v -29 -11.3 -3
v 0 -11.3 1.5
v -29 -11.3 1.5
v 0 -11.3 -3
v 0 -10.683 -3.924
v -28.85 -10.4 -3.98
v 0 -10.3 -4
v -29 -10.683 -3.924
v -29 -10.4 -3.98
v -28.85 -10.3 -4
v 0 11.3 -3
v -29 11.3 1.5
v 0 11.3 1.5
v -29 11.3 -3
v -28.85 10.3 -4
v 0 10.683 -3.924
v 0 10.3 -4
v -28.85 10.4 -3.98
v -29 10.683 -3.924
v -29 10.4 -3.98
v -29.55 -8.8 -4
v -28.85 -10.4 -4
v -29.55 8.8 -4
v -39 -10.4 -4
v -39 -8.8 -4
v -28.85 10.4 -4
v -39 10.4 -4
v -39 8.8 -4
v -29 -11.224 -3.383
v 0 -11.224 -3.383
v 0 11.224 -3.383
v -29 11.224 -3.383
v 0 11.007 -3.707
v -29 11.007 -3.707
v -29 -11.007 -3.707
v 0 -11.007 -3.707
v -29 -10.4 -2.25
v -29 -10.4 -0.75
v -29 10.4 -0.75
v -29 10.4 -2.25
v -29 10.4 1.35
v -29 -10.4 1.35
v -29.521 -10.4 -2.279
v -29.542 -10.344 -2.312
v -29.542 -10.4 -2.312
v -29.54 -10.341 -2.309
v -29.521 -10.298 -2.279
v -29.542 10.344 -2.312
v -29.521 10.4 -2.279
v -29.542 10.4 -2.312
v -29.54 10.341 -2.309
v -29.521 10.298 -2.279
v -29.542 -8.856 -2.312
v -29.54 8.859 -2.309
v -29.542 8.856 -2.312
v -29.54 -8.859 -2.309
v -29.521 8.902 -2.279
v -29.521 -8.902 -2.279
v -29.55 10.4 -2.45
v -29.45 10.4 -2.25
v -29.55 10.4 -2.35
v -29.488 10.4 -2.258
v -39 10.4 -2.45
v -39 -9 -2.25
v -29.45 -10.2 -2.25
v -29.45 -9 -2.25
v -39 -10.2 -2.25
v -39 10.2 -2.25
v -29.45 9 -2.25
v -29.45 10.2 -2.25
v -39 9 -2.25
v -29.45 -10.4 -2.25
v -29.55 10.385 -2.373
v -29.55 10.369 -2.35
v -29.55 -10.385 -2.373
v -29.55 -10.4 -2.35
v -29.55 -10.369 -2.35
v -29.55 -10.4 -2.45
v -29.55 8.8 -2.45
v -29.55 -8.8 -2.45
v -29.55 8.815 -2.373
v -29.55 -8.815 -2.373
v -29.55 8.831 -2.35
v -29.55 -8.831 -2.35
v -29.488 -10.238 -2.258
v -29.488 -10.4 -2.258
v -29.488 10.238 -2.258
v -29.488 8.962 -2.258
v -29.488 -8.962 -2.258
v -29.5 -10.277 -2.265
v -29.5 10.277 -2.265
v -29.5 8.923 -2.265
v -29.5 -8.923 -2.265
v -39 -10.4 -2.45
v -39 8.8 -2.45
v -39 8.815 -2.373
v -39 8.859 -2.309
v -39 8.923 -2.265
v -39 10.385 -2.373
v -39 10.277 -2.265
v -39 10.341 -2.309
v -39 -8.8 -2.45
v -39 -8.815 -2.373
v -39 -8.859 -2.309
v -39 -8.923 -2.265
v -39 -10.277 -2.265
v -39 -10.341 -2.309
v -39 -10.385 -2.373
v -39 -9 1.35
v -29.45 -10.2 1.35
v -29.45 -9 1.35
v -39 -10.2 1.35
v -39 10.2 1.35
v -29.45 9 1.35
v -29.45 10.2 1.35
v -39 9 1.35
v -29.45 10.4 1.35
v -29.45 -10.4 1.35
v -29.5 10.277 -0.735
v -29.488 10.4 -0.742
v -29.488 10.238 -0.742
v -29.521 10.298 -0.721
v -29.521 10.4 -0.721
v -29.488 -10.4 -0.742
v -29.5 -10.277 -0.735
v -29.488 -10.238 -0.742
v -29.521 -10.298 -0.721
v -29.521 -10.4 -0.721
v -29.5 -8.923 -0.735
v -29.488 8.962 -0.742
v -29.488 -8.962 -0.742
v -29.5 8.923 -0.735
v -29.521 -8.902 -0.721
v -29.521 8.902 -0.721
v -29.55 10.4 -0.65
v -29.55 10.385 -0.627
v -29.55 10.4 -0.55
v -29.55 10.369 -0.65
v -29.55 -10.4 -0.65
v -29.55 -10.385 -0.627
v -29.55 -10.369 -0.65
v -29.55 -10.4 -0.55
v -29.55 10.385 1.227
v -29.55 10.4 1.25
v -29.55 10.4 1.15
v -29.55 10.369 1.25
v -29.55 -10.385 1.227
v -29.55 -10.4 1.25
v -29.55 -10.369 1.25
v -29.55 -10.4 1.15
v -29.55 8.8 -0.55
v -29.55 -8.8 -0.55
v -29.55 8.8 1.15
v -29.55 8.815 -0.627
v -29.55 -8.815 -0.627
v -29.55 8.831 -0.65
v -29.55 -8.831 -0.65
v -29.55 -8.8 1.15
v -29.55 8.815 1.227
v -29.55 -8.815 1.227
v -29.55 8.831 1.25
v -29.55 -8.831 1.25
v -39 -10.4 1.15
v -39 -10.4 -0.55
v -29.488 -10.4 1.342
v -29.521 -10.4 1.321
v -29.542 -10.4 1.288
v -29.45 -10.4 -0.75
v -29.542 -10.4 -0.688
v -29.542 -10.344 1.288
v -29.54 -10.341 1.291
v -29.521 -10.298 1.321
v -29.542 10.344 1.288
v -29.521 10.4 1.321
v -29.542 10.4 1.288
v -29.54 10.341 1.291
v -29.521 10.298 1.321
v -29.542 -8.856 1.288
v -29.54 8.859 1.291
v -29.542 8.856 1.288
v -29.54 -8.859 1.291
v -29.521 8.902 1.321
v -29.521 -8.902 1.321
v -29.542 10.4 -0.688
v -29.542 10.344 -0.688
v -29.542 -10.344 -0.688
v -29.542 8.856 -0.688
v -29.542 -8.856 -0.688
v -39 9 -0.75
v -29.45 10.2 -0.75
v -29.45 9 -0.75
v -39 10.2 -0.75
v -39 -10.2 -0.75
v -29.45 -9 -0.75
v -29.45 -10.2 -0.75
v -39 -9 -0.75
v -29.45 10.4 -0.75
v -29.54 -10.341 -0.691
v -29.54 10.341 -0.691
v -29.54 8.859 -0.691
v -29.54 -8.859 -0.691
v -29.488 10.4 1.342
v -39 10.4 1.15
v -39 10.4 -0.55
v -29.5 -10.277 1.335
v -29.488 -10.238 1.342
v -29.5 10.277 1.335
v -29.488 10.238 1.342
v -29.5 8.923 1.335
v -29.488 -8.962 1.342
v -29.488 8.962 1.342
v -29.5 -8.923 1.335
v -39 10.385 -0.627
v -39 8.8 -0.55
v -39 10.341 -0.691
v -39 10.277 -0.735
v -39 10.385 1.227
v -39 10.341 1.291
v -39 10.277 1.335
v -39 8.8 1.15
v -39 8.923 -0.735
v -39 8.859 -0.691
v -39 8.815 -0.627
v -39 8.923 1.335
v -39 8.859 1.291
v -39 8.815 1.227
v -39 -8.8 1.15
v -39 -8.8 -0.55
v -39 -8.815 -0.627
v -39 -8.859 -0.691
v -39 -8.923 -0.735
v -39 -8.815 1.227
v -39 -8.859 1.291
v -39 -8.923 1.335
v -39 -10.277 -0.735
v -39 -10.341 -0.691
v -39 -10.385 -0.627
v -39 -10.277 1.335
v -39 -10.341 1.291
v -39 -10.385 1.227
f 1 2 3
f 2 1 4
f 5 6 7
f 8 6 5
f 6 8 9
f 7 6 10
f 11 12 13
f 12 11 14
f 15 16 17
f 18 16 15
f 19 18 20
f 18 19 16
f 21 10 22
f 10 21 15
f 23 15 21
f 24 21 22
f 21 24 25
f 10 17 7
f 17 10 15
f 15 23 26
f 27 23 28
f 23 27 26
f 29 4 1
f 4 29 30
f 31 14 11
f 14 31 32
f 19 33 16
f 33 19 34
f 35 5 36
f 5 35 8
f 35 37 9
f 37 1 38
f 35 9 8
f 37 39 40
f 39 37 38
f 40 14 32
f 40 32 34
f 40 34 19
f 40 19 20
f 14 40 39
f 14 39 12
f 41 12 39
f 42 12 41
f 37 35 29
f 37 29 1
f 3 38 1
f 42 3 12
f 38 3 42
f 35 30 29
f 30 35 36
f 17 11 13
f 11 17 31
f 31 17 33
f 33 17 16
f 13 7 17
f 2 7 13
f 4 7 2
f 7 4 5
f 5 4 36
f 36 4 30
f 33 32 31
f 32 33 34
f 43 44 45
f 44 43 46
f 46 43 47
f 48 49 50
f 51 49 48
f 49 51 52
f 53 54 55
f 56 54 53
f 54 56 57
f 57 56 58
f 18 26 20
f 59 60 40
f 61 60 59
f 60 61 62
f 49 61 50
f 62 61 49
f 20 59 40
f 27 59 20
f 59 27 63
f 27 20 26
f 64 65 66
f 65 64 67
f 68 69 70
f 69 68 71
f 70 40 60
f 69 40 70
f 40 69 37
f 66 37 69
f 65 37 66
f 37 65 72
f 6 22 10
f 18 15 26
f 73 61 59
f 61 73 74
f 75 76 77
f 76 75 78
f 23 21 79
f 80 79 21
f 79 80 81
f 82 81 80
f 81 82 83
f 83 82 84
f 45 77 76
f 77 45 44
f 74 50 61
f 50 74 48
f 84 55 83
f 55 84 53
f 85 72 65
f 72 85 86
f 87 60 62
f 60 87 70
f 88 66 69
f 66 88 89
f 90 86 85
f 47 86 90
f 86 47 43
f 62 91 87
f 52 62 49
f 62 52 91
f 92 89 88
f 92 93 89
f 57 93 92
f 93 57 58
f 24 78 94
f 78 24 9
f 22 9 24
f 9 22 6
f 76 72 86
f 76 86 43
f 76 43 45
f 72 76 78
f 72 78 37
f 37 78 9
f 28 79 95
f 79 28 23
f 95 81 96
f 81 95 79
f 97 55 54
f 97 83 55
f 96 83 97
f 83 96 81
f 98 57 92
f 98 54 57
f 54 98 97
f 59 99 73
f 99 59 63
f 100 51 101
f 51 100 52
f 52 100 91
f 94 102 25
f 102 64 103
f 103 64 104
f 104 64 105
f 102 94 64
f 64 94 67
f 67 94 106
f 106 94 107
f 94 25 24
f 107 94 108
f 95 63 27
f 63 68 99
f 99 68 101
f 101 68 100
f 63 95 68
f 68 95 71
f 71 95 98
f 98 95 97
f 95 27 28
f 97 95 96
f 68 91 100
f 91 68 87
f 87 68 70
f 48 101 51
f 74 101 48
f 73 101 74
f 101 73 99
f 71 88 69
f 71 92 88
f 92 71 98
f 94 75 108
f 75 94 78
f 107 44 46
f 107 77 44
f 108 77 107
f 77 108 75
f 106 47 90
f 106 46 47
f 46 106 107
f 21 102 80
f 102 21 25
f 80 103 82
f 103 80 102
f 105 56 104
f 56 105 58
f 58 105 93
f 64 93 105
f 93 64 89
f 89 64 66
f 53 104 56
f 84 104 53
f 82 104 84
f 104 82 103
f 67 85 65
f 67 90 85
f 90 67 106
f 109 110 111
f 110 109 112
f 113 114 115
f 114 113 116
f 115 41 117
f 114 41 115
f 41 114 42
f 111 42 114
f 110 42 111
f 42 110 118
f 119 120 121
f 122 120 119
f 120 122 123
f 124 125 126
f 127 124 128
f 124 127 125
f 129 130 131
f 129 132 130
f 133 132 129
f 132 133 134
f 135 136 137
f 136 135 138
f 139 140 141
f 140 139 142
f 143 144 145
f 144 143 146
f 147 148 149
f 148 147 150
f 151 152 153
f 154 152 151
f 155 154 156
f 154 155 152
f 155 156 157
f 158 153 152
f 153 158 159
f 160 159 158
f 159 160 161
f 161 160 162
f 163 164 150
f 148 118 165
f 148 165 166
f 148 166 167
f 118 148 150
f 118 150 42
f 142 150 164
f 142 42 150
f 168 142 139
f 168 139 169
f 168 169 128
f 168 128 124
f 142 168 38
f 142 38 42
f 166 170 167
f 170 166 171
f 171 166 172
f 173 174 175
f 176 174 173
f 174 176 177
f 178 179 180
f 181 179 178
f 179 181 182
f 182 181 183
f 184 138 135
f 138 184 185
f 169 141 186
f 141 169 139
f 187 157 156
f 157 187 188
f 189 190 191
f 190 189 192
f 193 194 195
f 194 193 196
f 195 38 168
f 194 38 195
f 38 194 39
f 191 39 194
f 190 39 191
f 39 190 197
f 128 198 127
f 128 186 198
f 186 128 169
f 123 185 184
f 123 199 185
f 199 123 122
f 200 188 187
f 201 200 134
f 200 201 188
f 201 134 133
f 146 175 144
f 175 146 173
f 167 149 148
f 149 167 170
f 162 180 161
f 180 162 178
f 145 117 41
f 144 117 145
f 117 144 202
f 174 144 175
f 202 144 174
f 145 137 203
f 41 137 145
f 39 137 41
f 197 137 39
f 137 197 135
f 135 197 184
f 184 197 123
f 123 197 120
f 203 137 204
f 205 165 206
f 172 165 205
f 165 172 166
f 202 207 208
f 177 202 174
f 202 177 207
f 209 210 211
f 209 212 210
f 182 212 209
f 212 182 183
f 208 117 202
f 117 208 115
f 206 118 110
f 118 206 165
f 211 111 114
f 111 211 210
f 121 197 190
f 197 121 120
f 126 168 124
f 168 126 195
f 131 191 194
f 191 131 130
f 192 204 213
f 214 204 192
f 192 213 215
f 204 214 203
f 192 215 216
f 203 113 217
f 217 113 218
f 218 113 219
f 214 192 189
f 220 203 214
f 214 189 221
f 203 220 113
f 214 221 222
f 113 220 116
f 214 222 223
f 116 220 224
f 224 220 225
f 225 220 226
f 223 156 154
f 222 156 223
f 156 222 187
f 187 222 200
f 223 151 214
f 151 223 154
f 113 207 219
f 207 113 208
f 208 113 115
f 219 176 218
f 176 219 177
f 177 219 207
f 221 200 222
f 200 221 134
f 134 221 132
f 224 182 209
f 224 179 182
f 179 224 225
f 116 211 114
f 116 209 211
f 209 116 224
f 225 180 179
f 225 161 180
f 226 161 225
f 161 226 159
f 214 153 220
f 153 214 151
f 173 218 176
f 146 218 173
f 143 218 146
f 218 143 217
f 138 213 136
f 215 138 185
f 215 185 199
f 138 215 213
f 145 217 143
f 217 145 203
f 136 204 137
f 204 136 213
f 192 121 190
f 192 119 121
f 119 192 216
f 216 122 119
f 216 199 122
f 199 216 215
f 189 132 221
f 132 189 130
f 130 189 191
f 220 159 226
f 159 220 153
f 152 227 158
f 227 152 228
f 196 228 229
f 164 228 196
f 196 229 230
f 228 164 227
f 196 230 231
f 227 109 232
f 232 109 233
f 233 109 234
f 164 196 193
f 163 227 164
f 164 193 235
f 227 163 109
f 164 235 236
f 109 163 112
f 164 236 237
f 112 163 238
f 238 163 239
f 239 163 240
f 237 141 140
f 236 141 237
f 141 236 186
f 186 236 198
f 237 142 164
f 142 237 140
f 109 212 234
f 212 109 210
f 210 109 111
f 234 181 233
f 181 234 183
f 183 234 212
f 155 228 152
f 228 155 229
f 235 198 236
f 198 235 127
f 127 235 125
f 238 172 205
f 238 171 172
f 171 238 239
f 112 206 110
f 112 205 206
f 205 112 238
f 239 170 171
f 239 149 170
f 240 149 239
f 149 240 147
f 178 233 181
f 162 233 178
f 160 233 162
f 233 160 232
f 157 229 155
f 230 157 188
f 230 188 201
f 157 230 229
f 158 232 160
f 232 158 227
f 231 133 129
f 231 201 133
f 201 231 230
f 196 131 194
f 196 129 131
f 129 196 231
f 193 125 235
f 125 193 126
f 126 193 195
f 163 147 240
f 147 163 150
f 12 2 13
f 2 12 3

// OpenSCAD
use <../microusb.scad>
microusb_unit(ox=40, with_vent=1, with_cabling=0, with_shell=0, with_support=1, with_arm=1, with_cut=1, with_lid=0);
